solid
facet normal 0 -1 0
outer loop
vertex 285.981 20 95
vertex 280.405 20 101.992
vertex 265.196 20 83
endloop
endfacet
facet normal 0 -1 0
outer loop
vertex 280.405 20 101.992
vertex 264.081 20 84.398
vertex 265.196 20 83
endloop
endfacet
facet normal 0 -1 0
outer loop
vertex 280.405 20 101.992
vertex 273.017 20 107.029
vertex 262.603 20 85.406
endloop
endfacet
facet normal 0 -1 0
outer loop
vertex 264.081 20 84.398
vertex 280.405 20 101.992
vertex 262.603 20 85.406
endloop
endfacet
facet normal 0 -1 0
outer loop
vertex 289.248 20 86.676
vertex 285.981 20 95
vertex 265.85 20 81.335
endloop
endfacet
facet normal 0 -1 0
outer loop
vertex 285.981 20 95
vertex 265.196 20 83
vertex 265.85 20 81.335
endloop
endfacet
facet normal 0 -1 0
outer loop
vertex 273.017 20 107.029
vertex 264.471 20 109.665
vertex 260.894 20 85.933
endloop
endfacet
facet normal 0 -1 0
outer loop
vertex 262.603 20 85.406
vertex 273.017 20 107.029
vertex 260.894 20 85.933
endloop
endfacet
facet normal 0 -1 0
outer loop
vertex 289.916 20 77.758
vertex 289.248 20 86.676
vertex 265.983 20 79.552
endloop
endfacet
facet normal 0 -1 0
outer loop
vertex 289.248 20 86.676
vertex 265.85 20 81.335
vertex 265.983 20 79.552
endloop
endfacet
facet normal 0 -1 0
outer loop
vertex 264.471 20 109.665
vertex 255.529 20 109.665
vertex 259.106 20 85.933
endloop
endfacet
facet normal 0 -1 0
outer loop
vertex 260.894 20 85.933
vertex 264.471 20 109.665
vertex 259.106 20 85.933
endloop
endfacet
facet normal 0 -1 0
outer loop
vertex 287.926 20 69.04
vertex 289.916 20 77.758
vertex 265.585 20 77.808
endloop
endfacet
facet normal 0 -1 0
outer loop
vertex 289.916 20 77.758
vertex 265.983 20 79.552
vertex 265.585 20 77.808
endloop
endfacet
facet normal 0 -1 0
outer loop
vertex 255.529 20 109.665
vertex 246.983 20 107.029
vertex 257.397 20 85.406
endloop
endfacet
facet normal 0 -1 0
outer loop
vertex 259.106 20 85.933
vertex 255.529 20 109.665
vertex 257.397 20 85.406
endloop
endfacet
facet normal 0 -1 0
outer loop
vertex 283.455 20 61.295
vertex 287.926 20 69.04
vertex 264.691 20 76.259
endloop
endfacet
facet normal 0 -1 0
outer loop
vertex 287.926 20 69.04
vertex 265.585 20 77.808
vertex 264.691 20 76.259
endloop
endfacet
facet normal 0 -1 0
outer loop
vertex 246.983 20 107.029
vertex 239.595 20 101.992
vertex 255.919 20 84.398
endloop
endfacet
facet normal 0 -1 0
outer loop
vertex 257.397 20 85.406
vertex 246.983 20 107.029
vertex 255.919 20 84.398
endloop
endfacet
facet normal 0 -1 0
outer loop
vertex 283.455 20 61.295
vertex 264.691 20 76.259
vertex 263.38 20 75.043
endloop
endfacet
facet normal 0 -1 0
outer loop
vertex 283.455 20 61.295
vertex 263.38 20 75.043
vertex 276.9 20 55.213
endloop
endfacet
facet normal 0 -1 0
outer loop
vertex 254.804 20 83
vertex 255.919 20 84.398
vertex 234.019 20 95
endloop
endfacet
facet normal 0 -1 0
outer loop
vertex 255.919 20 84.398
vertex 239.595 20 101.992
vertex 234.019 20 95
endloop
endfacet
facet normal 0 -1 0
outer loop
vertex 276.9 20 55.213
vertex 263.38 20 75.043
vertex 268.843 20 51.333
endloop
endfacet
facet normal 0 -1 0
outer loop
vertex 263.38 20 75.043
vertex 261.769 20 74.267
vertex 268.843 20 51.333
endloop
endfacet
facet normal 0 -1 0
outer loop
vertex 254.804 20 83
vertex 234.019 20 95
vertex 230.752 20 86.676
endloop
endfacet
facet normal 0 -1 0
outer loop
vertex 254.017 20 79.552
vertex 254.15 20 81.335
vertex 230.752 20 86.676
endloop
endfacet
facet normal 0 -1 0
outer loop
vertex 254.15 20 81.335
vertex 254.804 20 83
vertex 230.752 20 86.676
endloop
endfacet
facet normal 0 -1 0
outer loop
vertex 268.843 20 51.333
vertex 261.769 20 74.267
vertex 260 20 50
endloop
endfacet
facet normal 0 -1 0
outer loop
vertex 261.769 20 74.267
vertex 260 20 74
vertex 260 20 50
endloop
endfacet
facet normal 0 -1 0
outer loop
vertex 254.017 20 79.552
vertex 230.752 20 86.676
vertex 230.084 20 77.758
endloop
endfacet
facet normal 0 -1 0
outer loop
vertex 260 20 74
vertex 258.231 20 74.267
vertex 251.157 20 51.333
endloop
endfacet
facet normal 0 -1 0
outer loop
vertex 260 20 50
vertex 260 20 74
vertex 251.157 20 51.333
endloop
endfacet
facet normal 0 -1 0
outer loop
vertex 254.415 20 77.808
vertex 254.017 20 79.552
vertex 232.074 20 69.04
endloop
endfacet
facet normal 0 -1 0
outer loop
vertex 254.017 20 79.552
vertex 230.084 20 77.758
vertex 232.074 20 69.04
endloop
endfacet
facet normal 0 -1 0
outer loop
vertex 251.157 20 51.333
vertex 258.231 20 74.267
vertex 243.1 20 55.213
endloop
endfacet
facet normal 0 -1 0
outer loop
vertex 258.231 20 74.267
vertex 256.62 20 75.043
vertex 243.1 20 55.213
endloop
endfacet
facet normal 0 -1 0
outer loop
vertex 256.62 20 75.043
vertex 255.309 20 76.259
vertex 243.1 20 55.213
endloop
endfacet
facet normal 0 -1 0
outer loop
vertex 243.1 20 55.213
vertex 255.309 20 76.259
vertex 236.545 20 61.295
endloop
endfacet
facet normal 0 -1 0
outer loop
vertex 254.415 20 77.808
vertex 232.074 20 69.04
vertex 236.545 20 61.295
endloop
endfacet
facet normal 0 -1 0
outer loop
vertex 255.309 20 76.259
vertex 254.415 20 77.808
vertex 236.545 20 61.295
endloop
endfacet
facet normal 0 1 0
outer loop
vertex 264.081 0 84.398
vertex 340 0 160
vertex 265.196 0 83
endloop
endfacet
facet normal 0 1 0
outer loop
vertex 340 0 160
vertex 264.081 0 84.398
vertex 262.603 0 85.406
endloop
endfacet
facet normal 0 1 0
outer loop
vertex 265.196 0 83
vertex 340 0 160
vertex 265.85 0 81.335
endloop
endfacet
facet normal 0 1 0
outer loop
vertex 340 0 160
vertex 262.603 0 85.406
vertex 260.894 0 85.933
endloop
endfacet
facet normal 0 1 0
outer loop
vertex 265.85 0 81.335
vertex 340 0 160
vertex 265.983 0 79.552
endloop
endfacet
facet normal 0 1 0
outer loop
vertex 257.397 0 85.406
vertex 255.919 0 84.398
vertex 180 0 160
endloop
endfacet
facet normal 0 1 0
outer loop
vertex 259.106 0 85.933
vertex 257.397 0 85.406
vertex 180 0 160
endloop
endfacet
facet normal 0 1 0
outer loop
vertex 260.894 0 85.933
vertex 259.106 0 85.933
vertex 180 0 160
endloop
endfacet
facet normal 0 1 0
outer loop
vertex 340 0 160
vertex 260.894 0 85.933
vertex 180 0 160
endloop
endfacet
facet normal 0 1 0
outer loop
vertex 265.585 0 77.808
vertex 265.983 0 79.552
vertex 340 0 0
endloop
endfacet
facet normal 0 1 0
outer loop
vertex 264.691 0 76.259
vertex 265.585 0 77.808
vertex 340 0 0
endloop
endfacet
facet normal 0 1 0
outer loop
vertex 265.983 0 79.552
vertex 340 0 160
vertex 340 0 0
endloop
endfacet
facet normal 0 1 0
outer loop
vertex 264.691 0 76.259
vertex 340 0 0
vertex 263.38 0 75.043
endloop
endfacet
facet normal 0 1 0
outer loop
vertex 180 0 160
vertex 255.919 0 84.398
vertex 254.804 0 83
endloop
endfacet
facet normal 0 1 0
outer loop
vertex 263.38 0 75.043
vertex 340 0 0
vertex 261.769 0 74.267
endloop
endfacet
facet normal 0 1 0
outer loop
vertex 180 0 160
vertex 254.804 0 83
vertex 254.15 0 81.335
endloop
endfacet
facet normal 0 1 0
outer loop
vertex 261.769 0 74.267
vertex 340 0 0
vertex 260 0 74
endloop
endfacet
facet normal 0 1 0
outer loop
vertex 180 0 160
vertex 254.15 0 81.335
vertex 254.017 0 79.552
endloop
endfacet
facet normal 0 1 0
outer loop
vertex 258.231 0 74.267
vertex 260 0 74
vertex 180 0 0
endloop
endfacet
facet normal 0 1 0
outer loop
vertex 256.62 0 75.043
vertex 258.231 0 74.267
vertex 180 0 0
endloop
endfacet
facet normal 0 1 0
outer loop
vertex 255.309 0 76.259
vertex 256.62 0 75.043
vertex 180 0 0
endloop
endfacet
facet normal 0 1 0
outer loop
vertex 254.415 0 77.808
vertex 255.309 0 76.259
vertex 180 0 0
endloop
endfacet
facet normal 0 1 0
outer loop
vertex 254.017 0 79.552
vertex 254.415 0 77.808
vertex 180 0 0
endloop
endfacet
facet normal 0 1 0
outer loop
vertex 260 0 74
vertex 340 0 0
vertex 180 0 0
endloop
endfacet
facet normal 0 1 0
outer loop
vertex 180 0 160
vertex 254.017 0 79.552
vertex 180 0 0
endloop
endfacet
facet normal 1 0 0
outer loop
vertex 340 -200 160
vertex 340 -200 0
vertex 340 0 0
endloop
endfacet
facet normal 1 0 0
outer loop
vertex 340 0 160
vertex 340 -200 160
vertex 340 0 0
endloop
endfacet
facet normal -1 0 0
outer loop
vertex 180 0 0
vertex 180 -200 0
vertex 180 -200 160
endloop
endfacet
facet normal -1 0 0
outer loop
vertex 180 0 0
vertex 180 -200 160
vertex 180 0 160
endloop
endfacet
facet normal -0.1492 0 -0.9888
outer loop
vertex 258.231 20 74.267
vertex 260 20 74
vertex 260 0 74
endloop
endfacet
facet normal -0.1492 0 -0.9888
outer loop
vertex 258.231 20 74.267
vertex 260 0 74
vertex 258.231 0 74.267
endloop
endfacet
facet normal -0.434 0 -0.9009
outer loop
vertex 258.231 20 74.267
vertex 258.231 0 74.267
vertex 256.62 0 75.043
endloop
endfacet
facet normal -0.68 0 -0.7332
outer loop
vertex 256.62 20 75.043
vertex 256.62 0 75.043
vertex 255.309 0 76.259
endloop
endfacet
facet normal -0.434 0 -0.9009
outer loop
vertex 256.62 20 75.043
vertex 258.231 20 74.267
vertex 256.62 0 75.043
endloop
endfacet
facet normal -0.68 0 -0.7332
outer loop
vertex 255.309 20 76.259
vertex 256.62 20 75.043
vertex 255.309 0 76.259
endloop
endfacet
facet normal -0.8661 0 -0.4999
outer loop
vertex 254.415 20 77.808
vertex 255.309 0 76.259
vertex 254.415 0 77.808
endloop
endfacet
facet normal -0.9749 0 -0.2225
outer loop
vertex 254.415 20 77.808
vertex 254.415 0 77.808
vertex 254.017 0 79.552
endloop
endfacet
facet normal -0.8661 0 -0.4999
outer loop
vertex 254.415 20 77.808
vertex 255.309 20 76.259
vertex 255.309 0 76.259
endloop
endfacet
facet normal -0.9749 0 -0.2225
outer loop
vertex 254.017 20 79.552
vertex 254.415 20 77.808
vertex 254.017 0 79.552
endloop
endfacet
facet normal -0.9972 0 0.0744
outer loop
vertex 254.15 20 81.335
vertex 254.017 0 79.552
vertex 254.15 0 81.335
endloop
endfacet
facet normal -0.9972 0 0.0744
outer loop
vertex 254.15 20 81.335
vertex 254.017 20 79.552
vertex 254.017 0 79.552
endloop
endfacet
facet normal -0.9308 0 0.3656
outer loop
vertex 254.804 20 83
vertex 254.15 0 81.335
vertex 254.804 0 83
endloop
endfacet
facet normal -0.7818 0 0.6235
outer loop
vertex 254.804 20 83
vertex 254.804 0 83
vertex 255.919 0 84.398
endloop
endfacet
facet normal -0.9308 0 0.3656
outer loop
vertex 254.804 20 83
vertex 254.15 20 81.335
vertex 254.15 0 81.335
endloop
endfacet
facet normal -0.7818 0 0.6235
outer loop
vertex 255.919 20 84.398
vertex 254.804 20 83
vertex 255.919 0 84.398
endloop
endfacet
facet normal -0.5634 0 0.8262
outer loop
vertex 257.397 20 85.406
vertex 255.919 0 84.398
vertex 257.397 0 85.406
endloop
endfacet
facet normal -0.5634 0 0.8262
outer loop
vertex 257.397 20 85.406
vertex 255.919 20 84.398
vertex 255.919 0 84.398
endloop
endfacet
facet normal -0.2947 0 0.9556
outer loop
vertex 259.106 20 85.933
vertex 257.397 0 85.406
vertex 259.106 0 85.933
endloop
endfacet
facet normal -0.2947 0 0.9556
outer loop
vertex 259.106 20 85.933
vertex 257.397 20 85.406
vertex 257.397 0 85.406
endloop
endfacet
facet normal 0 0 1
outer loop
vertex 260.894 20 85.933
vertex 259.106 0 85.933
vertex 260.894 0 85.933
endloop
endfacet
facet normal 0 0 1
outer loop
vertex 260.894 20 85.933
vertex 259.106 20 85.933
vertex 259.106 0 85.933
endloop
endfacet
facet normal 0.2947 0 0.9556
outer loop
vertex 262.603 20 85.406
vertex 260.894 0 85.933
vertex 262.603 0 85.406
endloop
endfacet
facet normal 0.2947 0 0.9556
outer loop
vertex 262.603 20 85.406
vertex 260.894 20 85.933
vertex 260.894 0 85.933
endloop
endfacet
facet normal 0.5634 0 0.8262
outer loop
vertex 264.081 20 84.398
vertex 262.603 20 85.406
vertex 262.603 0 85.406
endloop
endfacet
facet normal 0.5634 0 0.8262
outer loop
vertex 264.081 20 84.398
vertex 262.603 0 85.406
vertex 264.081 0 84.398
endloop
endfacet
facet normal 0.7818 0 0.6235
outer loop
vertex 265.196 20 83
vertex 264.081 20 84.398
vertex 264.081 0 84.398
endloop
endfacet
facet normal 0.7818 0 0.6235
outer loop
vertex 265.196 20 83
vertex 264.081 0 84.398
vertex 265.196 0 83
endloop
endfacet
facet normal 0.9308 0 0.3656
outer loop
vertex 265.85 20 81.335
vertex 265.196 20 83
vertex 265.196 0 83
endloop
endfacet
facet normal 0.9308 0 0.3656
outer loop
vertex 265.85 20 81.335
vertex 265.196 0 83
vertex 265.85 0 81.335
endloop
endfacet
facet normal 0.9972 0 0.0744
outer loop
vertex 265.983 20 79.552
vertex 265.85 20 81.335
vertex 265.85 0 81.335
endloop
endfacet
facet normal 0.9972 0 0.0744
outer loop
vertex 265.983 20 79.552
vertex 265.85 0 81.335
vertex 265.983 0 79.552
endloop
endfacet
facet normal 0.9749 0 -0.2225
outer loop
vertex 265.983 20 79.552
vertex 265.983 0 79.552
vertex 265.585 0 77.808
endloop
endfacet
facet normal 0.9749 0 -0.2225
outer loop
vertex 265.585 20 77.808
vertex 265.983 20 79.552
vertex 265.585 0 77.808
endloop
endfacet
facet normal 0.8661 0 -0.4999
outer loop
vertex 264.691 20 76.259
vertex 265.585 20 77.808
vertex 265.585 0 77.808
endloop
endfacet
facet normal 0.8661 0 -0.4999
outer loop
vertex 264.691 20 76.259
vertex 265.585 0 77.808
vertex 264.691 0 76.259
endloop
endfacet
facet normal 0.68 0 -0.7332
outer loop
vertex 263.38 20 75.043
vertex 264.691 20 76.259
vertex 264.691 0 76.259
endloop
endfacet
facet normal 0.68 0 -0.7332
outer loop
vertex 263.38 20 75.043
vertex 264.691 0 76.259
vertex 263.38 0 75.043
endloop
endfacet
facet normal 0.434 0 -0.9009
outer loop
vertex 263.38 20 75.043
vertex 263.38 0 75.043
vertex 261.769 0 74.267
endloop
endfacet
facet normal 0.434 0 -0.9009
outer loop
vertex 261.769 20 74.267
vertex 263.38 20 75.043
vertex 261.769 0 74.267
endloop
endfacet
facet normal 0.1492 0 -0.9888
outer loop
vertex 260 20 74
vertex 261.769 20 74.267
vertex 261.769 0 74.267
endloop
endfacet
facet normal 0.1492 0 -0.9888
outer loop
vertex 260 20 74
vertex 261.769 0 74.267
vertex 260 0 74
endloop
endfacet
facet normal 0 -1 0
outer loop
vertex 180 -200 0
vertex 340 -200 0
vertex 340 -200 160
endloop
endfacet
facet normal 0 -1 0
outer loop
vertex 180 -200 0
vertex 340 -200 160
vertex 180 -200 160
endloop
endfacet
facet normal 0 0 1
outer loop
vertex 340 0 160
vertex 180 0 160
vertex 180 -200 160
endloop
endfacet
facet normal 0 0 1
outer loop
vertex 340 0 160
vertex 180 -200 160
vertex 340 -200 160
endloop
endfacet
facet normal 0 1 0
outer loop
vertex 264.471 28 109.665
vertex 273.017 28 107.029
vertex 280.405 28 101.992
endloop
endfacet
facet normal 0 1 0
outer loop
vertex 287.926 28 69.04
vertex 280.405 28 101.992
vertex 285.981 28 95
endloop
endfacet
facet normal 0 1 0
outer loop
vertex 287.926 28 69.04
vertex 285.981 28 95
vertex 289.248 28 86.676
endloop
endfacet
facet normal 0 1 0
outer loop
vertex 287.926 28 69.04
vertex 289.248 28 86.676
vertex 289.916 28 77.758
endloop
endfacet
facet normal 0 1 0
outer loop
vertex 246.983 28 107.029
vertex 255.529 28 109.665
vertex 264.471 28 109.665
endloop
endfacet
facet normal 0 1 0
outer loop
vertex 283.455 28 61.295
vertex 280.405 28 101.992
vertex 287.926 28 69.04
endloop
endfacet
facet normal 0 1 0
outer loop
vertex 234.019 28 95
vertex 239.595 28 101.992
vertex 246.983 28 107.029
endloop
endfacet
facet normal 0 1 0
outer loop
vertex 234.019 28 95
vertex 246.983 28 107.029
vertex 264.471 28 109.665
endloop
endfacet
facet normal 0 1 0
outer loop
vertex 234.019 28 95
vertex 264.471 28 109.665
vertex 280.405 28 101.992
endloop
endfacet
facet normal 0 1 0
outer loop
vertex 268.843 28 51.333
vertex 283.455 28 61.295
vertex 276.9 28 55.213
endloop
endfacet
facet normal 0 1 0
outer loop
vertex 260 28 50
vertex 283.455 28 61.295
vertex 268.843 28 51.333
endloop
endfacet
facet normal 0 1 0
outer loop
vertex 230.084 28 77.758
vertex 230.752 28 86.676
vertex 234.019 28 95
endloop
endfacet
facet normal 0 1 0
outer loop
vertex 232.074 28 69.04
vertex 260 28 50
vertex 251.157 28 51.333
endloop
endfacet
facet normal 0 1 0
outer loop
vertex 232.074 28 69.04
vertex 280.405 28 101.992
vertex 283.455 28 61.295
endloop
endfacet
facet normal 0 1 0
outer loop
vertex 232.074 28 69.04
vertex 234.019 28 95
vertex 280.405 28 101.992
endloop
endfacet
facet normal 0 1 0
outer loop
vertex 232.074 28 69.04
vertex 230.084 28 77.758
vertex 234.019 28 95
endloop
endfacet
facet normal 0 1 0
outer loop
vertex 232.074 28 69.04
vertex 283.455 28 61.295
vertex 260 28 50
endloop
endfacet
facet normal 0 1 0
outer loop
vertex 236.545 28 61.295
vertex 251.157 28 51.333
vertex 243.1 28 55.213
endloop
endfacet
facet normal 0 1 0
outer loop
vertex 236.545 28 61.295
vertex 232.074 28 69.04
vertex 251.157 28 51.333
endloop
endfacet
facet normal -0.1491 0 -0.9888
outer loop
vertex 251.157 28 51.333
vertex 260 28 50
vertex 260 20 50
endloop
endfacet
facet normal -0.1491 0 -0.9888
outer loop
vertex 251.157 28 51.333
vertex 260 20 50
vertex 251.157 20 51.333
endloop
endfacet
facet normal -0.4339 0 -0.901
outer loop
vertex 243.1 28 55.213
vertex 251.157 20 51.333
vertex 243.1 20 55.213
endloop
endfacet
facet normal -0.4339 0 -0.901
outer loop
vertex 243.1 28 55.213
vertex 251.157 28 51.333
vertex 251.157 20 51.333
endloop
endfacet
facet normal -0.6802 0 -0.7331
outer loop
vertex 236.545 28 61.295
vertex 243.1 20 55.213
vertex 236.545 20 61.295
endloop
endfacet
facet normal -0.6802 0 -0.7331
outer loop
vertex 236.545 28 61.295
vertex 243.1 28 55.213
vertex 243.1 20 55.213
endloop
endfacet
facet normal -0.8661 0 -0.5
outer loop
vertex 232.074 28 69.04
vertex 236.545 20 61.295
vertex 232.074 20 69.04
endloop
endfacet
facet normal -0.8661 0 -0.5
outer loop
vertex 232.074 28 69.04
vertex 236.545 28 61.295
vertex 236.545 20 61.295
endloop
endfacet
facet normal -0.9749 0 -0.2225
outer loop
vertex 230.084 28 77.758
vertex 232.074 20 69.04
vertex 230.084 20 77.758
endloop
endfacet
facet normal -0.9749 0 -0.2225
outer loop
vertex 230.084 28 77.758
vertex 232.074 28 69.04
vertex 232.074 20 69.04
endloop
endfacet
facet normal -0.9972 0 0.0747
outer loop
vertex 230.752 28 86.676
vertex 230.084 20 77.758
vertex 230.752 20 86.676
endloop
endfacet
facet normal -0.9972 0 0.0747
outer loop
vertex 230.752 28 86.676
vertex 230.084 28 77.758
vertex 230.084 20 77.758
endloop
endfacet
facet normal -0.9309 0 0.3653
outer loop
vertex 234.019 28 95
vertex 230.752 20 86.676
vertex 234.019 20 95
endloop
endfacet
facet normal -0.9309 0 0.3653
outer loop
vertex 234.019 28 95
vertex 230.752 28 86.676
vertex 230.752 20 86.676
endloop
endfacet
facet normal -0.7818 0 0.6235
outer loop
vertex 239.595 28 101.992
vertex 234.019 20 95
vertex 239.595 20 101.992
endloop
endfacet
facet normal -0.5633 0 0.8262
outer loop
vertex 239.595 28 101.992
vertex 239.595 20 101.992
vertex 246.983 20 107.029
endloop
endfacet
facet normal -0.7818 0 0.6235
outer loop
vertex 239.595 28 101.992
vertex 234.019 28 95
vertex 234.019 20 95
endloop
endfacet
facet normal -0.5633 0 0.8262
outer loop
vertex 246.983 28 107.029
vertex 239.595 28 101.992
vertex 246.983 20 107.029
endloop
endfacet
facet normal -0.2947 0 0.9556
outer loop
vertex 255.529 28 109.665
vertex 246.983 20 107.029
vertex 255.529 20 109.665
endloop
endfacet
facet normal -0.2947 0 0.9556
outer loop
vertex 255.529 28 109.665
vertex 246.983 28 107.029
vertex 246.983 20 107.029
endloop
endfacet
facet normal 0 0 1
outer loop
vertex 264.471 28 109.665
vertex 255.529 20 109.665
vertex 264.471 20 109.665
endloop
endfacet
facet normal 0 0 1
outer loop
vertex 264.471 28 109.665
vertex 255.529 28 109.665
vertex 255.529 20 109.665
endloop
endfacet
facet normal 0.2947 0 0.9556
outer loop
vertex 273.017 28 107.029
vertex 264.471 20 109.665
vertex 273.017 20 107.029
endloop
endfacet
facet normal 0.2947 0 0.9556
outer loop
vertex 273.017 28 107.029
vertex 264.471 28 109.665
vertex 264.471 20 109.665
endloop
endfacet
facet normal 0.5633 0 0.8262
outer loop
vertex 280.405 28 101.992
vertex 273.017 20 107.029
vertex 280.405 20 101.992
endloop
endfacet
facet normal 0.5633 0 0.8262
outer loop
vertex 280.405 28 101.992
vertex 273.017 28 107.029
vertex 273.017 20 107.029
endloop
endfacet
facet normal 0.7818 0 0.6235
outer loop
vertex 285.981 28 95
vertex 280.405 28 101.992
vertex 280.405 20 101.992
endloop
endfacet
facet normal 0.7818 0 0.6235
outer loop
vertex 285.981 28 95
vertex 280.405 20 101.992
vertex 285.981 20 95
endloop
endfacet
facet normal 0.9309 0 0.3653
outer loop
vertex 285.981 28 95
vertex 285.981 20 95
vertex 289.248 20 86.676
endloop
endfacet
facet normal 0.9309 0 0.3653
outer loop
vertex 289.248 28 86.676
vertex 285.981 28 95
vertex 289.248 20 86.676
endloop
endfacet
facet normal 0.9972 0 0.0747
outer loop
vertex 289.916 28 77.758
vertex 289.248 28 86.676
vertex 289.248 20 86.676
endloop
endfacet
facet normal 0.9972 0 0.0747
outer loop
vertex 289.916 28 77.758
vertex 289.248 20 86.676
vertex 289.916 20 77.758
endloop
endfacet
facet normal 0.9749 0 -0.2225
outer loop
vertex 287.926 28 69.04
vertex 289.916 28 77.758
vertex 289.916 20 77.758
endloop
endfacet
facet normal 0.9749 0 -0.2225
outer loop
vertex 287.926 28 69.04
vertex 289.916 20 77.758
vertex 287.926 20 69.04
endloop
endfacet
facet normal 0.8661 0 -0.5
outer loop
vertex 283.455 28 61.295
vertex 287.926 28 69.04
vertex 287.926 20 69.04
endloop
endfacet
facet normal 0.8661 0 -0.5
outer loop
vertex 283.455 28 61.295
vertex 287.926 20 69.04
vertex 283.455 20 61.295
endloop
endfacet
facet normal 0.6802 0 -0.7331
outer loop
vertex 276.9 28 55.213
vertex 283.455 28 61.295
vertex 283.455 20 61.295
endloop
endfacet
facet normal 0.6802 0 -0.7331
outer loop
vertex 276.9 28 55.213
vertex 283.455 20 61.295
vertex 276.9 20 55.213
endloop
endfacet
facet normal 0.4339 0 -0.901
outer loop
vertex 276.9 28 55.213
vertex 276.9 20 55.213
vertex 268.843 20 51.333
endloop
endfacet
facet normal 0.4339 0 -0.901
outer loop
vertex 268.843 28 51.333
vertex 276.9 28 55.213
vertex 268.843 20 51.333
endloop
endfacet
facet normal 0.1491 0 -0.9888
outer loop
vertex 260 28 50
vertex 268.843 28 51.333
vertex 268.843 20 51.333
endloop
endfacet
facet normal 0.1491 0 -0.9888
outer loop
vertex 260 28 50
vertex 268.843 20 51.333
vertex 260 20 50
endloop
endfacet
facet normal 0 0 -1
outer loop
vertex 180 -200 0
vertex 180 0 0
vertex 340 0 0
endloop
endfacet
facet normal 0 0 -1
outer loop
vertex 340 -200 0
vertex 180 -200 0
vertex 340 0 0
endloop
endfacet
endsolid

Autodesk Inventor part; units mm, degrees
ref_plane "YZ Plane" through (0, 0, 0) normal (1, 0, 0) x (0, 1, 0)
ref_plane "XZ Plane" through (0, 0, 0) normal (0, 1, 0) x (-1, 0, 0)
ref_plane "XY Plane" through (0, 0, 0) normal (0, 0, 1) x (1, 0, 0)
sketch "Sketch1" plane through (0, 0, 0) normal (0, 0, 1) x (1, 0, 0)
  line L0 (700, -200) -> (180, -200) projected
  line L1 (180, -200) -> (-160, -200) projected
  line L2 (-160, -200) -> (-160, 200) projected
  line L3 (180, -200) -> (180, 200) projected
  line L4 (700, -200) -> (1018.8395, -200) projected
  line L5 (1018.8395, -200) -> (1018.8395, 200) projected
  line L6 (1018.8395, 200) -> (700, 200) projected
  line L7 (180, 200) -> (700, 200) projected
  line L8 (-160, 200) -> (180, 200) projected
  line L9 (740, 160) -> (740, 200) projected
  line L10 (740, 160) -> (740, -160) projected
  line L11 (740, -200) -> (740, -160) projected
  line L12 (700, 160) -> (700, -160) projected
  line L13 (700, -160) -> (700, -200) projected
  line L14 (700, 200) -> (700, 160) projected
  line L15 (140, 160) -> (140, 200) projected
  line L16 (140, -200) -> (140, -160) projected
  line L17 (140, 160) -> (140, -160) projected
  line L18 (700, -160) -> (180, -160) projected
  line L19 (180, 160) -> (700, 160) projected
  line L20 (180, -200) -> (340, -200)
  line L21 (340, -200) -> (340, 0)
  line L22 (340, 0) -> (180, 0)
  line L23 (180, 0) -> (180, -200)
  point P0 (0, 0)
  point P1 (260, 0)
  point P2 (140, 0)
  dimension "d0" = 160
extrude "Extrusion1" add sketch "Sketch1" along normal blind 160 contours L0 L3 L18 L21 | L18 L3 L22 L21
ref_plane "Work Plane1" through (260, -200, 0) normal (1, 0, 0) x (0, 0, -1)
sketch "Sketch2" plane through (260, -200, 0) normal (1, 0, 0) x (0, 0, -1)
  line L0 (0, 200) -> (0, 0) projected
  line L1 (0, 0) -> (-160, 0) projected
  line L2 (-160, 200) -> (-160, 0) projected
  line L3 (0, 200) -> (-160, 200) projected
  line L4 (0, 0) -> (-160, 0) projected
  line L5 (-80, 0) -> (-80, 200)
  line L6 (0, 200) -> (-160, 200) projected
  line L7 (-74, 200) -> (-74, 220)
  line L8 (-74, 220) -> (-50, 220)
  line L9 (-50, 220) -> (-50, 228)
  line L10 (-50, 228) -> (-80, 228)
  line L11 (-80, 228) -> (-80, 200)
  line L12 (-80, 200) -> (-80, 294.9893)
  dimension "d6" = 8
  dimension "d7" = 12
  dimension "d8" = 20
  dimension "d9" = 30
  dimension "d10" = 94.9893
revolve "Revolution1" add sketch "Sketch2" angle 360 about axis through (260, 0, 80) along (0, 1, 0) contours L3 L11 L10 L9 L8 L7
properties part number "aandrijfMotor"
